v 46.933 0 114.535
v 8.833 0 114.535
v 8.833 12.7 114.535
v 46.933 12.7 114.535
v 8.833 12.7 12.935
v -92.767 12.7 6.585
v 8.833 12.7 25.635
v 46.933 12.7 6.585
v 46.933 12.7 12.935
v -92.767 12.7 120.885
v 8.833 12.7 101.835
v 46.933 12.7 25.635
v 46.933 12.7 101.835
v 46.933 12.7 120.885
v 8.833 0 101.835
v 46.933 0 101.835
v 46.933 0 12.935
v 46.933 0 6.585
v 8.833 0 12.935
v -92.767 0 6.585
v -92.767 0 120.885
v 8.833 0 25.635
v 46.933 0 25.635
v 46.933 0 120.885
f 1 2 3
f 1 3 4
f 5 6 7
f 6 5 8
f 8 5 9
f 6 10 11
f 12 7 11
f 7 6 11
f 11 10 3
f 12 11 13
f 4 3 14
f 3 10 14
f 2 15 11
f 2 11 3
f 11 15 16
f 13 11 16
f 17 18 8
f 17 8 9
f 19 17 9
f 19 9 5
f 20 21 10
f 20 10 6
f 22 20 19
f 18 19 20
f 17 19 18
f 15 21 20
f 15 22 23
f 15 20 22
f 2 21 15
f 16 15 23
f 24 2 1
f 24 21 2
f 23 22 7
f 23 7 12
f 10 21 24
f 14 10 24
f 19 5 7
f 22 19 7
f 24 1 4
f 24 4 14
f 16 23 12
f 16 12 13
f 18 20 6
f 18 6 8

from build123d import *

# Parameters (mm, degrees)
F0_W     = 101.6
F0_H     = 50.8
F0_H_2   = 12.7
F0_H_3   = 76.2
F1_DEPTH = 12.7
F2_W     = 50.8
F2_H     = 203.2
F3_DEPTH = 25.4
F4_W     = 12.7
F4_H     = 50.8
F4_H_2   = 76.2
F5_DEPTH = 25.4
F6_W     = 139.7
F6_H     = 44.45
F7_DEPTH = 25.4


with BuildPart() as f1:
    # F0 (on Front) → F1 (new body)
    with BuildSketch(Plane.XZ):
        with Locations((-41.9671071525, -12.46464407)):
            Rectangle(F0_W, F0_H)
        with Locations((59.6328928475, -12.46464407)):
            Rectangle(F0_W, F0_H)
        with Locations((-41.9671071525, 139.93535593)):
            Rectangle(F0_W, F0_H)
        with Locations((59.6328928475, 139.93535593)):
            Rectangle(F0_W, F0_H)
        with Locations((-41.9671071525, 19.28535593)):
            Rectangle(F0_W, F0_H_2)
        with Locations((-41.9671071525, 63.73535593)):
            Rectangle(F0_W, F0_H_3)
        with Locations((-41.9671071525, 108.18535593)):
            Rectangle(F0_W, F0_H_2)
        with Locations((59.6328928475, 63.73535593)):
            Rectangle(F0_W, F0_H_3)
    extrude(amount=-F1_DEPTH)

    # F2 (on face) → F3 (cut)
    with BuildSketch(Plane.XZ):
        with Locations((85.0328928475, 63.73535593)):
            Rectangle(F2_W, F2_H)
    extrude(amount=-F3_DEPTH, mode=Mode.SUBTRACT)

    # F4 (on face) → F5 (cut)
    with BuildSketch(Plane.XZ):
        with Locations((53.2828928475, 139.93535593)):
            Rectangle(F4_W, F4_H)
        with Locations((53.2828928475, -12.46464407)):
            Rectangle(F4_W, F4_H)
        with Locations((53.2828928475, 63.73535593)):
            Rectangle(F4_W, F4_H_2)
    extrude(amount=-F5_DEPTH, mode=Mode.SUBTRACT)

    # F6 (on face) → F7 (cut)
    with BuildSketch(Plane.XZ):
        with Locations((-22.9171071525, 143.11035593)):
            Rectangle(F6_W, F6_H)
        with Locations((-22.9171071525, -15.63964407)):
            Rectangle(F6_W, F6_H)
    extrude(amount=-F7_DEPTH, mode=Mode.SUBTRACT)


solid = f1.part
